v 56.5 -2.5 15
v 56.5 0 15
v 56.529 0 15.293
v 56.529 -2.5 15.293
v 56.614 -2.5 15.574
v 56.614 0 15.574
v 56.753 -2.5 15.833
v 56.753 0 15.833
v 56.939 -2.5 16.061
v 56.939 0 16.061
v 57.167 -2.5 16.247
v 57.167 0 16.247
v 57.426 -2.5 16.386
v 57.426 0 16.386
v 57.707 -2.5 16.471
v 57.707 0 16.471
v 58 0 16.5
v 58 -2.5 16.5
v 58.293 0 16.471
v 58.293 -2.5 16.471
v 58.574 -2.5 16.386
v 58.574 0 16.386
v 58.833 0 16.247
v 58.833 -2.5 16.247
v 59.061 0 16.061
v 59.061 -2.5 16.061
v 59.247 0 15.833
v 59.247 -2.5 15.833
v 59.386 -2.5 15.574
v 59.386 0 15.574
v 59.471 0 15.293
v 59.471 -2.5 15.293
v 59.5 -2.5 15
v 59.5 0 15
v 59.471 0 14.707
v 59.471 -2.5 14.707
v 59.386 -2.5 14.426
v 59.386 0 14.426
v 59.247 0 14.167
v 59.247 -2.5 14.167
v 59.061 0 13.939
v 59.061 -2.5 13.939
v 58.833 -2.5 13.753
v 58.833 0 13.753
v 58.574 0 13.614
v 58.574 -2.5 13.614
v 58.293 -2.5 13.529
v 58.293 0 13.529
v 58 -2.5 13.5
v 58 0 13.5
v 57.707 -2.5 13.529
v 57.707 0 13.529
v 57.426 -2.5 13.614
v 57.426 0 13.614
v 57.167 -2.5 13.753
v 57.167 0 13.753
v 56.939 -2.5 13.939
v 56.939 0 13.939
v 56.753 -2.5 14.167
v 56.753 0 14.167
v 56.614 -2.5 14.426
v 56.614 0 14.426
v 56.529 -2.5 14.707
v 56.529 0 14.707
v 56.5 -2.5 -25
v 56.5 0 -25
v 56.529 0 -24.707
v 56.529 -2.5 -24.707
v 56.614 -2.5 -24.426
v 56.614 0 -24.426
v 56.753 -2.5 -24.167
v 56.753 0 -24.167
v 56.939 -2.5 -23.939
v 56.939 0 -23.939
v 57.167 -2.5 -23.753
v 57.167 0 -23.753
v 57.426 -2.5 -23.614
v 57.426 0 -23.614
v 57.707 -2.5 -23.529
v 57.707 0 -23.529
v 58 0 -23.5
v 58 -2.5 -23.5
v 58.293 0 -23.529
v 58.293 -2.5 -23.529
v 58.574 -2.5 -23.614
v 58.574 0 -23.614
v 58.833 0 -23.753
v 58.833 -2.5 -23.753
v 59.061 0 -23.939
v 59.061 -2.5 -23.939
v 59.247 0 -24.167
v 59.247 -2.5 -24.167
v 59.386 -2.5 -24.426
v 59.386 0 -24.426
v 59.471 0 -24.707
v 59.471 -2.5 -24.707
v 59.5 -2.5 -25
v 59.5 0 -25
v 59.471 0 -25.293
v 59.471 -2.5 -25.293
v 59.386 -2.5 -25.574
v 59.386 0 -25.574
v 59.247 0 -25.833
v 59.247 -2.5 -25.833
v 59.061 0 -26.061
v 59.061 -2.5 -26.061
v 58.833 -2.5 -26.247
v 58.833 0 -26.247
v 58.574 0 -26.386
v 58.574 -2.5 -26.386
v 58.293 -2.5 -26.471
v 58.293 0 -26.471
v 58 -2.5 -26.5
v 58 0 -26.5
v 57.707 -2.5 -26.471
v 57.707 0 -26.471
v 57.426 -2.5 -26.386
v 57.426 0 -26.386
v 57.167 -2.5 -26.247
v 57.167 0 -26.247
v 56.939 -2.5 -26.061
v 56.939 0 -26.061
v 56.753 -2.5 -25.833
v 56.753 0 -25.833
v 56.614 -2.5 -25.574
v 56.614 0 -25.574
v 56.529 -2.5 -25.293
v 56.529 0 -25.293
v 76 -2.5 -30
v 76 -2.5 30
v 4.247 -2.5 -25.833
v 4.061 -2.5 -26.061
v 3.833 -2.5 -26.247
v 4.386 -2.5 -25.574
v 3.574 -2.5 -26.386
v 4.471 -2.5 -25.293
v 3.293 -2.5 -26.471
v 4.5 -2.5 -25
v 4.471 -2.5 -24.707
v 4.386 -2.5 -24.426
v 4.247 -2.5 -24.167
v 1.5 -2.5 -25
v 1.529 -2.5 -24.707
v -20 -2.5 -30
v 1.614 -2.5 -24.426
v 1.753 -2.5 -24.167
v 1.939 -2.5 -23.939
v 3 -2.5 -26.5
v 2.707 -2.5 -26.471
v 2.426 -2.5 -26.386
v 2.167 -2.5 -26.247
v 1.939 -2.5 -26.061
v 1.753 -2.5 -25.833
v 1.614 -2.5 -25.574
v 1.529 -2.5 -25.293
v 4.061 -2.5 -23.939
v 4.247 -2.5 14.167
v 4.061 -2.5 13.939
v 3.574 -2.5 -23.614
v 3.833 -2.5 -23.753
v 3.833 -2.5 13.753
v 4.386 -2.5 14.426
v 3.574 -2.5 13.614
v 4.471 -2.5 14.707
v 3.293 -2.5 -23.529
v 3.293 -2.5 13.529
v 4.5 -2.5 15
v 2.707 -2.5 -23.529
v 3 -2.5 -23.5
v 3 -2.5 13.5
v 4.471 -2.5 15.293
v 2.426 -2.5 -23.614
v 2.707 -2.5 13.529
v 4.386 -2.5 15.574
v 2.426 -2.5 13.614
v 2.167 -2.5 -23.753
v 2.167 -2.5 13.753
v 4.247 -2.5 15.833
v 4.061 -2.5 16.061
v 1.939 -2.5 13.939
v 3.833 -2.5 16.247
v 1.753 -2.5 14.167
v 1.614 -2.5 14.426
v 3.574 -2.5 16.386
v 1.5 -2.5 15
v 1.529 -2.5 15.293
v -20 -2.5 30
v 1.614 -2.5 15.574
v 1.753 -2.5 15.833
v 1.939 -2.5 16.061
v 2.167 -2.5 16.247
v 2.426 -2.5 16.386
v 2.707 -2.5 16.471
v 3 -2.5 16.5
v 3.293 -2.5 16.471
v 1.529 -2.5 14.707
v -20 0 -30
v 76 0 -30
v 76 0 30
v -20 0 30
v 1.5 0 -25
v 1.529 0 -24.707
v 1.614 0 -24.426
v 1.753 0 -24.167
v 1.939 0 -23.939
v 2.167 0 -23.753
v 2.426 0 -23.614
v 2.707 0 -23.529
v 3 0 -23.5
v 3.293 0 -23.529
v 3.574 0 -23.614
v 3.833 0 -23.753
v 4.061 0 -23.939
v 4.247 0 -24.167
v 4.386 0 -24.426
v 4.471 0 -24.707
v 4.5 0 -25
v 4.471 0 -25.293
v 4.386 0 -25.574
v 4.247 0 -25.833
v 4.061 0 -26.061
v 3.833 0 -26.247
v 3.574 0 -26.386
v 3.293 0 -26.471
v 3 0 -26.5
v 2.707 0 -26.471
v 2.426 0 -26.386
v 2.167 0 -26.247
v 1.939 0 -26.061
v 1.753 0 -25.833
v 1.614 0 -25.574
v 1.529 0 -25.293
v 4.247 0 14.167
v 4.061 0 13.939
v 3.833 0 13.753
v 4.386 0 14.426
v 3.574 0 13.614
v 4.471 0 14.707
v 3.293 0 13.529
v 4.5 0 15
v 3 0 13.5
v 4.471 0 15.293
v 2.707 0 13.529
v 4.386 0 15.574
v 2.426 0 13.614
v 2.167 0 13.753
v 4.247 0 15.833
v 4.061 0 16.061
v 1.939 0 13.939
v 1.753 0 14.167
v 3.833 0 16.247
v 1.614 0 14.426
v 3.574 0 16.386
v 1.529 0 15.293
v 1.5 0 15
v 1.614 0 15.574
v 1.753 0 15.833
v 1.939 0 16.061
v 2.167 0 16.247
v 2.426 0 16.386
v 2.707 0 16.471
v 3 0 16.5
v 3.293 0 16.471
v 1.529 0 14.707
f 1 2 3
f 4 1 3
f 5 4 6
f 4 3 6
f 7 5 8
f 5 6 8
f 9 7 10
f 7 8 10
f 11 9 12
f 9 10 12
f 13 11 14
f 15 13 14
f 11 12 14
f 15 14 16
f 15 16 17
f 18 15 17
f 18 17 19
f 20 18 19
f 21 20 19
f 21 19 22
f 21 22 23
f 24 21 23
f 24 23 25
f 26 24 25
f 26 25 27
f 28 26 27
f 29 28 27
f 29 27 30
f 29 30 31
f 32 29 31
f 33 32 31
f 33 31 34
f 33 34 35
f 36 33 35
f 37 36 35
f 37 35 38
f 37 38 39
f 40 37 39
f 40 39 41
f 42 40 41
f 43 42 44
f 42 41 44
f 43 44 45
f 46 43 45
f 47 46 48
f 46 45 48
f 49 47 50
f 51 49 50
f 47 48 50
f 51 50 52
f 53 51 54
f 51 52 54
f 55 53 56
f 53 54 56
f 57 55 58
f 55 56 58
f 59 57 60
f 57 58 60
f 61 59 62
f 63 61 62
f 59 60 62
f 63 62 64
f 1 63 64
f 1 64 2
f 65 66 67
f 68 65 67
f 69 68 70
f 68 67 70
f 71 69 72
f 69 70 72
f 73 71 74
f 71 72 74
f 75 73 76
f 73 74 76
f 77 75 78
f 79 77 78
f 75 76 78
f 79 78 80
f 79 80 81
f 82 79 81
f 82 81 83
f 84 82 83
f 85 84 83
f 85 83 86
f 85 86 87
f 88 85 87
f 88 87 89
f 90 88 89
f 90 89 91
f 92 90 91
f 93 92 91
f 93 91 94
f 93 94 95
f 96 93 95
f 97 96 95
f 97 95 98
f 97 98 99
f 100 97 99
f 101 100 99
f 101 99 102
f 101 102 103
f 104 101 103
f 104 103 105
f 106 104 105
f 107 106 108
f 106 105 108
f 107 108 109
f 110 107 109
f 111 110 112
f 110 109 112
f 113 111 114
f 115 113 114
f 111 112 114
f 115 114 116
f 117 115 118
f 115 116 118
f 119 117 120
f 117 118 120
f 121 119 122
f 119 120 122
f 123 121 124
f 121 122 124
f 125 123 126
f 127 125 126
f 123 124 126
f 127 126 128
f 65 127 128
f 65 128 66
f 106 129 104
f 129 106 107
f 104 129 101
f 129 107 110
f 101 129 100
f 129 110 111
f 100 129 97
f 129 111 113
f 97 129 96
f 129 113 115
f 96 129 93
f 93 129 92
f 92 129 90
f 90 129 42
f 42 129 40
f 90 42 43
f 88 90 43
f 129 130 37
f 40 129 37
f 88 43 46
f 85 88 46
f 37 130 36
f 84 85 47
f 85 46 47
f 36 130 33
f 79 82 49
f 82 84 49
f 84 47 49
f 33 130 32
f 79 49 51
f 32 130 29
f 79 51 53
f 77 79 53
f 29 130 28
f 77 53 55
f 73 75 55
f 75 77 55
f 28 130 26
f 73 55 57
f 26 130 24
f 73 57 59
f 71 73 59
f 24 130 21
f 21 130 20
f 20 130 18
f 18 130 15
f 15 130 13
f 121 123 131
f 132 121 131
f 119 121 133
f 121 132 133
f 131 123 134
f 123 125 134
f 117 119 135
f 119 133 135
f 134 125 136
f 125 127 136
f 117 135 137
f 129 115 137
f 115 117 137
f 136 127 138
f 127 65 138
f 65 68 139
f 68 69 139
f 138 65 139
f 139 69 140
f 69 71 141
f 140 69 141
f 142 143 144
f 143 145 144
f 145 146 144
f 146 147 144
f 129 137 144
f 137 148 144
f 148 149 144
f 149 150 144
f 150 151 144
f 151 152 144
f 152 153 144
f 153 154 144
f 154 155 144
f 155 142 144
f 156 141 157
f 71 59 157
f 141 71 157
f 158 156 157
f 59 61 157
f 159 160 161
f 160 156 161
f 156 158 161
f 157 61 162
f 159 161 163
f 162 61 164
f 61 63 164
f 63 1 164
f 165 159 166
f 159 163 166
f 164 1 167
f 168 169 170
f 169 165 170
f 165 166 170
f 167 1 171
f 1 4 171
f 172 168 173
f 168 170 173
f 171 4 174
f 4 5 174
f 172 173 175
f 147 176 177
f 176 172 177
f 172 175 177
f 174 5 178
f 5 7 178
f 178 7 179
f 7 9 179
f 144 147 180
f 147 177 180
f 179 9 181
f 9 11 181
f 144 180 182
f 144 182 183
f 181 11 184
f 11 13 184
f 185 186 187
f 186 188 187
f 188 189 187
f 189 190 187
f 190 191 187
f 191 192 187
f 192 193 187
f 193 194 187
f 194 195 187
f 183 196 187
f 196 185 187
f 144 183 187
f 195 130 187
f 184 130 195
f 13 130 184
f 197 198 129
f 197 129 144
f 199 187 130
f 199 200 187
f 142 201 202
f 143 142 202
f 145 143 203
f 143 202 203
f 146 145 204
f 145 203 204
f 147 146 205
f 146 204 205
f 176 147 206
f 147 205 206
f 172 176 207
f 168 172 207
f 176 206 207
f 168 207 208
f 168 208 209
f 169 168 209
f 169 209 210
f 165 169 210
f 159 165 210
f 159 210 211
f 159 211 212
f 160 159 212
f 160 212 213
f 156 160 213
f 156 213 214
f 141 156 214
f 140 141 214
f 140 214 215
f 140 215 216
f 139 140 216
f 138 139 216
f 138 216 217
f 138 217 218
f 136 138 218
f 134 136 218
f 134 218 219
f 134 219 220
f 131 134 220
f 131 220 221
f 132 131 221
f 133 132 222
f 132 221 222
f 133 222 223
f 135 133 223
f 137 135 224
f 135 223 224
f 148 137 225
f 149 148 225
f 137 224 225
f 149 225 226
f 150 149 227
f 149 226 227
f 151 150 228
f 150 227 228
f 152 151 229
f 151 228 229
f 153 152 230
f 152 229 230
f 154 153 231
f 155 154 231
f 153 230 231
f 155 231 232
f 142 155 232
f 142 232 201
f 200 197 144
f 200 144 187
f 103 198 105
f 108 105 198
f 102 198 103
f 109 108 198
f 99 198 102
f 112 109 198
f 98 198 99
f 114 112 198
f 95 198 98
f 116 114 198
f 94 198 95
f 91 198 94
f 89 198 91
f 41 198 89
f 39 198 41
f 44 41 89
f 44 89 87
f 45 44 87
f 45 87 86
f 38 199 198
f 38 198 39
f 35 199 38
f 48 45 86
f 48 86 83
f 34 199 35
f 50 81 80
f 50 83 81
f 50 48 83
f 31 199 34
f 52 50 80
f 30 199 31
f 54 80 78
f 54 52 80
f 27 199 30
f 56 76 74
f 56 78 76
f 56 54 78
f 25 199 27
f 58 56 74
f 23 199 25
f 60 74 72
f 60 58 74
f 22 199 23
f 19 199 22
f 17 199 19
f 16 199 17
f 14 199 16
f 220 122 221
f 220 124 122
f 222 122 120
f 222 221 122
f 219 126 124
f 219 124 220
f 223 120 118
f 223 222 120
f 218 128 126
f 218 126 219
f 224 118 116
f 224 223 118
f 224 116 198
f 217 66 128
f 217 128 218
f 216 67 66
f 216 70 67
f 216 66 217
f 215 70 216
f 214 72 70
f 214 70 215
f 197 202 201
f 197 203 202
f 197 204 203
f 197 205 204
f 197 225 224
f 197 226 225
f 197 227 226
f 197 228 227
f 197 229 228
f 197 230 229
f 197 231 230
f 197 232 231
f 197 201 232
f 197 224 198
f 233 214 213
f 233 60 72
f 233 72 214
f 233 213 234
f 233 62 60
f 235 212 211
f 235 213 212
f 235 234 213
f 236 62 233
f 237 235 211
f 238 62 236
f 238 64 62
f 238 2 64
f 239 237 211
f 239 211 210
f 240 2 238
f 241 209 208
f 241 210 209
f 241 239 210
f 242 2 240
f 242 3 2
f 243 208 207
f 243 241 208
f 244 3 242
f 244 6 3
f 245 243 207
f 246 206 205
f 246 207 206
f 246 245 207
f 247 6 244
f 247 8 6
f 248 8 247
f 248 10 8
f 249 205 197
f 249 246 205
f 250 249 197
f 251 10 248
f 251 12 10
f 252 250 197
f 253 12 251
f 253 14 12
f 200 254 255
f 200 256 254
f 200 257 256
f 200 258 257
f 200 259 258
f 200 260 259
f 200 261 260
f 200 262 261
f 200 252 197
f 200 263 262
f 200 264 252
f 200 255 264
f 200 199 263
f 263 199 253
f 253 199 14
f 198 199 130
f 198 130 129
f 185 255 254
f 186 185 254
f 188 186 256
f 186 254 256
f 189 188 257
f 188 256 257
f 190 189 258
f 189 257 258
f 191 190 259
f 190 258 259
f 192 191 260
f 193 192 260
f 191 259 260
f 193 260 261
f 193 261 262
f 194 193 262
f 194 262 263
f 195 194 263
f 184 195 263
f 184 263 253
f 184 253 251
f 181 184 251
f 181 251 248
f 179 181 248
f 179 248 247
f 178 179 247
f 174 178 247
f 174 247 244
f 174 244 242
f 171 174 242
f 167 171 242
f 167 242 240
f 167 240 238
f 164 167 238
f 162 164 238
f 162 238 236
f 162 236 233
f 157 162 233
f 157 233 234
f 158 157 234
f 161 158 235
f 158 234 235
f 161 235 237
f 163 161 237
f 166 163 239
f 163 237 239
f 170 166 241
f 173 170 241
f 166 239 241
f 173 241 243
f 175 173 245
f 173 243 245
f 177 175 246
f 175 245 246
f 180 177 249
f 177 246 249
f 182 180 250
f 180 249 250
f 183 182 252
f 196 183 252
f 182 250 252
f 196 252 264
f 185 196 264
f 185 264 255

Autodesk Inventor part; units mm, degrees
ref_plane "YZ Plane" through (0, 0, 0) normal (1, 0, 0) x (0, 1, 0)
ref_plane "XZ Plane" through (0, 0, 0) normal (0, 1, 0) x (-1, 0, 0)
ref_plane "XY Plane" through (0, 0, 0) normal (0, 0, 1) x (1, 0, 0)
sketch "Boceto1" plane through (0, 0, 0) normal (0, 1, 0) x (-1, 0, 0)
  line L0 (20, 30) -> (-76, 30)
  line L1 (-76, 30) -> (-76, -30)
  line L2 (-76, -30) -> (20, -30)
  line L3 (20, -30) -> (20, 30)
  line L4 (-3, -25) -> (-58, -25) construction
  line L5 (-58, -25) -> (-58, 15) construction
  line L6 (-58, 15) -> (-3, 15) construction
  line L7 (-3, 15) -> (-3, -25) construction
  circle A0 centre (-58, -25) radius 1.5
  circle A1 centre (-3, -25) radius 1.5
  circle A2 centre (-3, 15) radius 1.5
  circle A3 centre (-58, 15) radius 1.5
  point P0 (0, 0)
  point P1 (20, 0)
  dimension "d0" = 3
  dimension "d1" = 60
  dimension "d2" = 18
  dimension "d5" = 96
  dimension "d6" = 20
  dimension "d7" = 15
  dimension "d8" = 5
  dimension "d9" = 55
extrude "Extrusión1" add sketch "Boceto1" against normal blind 2.5
properties part number "placa circuito"
